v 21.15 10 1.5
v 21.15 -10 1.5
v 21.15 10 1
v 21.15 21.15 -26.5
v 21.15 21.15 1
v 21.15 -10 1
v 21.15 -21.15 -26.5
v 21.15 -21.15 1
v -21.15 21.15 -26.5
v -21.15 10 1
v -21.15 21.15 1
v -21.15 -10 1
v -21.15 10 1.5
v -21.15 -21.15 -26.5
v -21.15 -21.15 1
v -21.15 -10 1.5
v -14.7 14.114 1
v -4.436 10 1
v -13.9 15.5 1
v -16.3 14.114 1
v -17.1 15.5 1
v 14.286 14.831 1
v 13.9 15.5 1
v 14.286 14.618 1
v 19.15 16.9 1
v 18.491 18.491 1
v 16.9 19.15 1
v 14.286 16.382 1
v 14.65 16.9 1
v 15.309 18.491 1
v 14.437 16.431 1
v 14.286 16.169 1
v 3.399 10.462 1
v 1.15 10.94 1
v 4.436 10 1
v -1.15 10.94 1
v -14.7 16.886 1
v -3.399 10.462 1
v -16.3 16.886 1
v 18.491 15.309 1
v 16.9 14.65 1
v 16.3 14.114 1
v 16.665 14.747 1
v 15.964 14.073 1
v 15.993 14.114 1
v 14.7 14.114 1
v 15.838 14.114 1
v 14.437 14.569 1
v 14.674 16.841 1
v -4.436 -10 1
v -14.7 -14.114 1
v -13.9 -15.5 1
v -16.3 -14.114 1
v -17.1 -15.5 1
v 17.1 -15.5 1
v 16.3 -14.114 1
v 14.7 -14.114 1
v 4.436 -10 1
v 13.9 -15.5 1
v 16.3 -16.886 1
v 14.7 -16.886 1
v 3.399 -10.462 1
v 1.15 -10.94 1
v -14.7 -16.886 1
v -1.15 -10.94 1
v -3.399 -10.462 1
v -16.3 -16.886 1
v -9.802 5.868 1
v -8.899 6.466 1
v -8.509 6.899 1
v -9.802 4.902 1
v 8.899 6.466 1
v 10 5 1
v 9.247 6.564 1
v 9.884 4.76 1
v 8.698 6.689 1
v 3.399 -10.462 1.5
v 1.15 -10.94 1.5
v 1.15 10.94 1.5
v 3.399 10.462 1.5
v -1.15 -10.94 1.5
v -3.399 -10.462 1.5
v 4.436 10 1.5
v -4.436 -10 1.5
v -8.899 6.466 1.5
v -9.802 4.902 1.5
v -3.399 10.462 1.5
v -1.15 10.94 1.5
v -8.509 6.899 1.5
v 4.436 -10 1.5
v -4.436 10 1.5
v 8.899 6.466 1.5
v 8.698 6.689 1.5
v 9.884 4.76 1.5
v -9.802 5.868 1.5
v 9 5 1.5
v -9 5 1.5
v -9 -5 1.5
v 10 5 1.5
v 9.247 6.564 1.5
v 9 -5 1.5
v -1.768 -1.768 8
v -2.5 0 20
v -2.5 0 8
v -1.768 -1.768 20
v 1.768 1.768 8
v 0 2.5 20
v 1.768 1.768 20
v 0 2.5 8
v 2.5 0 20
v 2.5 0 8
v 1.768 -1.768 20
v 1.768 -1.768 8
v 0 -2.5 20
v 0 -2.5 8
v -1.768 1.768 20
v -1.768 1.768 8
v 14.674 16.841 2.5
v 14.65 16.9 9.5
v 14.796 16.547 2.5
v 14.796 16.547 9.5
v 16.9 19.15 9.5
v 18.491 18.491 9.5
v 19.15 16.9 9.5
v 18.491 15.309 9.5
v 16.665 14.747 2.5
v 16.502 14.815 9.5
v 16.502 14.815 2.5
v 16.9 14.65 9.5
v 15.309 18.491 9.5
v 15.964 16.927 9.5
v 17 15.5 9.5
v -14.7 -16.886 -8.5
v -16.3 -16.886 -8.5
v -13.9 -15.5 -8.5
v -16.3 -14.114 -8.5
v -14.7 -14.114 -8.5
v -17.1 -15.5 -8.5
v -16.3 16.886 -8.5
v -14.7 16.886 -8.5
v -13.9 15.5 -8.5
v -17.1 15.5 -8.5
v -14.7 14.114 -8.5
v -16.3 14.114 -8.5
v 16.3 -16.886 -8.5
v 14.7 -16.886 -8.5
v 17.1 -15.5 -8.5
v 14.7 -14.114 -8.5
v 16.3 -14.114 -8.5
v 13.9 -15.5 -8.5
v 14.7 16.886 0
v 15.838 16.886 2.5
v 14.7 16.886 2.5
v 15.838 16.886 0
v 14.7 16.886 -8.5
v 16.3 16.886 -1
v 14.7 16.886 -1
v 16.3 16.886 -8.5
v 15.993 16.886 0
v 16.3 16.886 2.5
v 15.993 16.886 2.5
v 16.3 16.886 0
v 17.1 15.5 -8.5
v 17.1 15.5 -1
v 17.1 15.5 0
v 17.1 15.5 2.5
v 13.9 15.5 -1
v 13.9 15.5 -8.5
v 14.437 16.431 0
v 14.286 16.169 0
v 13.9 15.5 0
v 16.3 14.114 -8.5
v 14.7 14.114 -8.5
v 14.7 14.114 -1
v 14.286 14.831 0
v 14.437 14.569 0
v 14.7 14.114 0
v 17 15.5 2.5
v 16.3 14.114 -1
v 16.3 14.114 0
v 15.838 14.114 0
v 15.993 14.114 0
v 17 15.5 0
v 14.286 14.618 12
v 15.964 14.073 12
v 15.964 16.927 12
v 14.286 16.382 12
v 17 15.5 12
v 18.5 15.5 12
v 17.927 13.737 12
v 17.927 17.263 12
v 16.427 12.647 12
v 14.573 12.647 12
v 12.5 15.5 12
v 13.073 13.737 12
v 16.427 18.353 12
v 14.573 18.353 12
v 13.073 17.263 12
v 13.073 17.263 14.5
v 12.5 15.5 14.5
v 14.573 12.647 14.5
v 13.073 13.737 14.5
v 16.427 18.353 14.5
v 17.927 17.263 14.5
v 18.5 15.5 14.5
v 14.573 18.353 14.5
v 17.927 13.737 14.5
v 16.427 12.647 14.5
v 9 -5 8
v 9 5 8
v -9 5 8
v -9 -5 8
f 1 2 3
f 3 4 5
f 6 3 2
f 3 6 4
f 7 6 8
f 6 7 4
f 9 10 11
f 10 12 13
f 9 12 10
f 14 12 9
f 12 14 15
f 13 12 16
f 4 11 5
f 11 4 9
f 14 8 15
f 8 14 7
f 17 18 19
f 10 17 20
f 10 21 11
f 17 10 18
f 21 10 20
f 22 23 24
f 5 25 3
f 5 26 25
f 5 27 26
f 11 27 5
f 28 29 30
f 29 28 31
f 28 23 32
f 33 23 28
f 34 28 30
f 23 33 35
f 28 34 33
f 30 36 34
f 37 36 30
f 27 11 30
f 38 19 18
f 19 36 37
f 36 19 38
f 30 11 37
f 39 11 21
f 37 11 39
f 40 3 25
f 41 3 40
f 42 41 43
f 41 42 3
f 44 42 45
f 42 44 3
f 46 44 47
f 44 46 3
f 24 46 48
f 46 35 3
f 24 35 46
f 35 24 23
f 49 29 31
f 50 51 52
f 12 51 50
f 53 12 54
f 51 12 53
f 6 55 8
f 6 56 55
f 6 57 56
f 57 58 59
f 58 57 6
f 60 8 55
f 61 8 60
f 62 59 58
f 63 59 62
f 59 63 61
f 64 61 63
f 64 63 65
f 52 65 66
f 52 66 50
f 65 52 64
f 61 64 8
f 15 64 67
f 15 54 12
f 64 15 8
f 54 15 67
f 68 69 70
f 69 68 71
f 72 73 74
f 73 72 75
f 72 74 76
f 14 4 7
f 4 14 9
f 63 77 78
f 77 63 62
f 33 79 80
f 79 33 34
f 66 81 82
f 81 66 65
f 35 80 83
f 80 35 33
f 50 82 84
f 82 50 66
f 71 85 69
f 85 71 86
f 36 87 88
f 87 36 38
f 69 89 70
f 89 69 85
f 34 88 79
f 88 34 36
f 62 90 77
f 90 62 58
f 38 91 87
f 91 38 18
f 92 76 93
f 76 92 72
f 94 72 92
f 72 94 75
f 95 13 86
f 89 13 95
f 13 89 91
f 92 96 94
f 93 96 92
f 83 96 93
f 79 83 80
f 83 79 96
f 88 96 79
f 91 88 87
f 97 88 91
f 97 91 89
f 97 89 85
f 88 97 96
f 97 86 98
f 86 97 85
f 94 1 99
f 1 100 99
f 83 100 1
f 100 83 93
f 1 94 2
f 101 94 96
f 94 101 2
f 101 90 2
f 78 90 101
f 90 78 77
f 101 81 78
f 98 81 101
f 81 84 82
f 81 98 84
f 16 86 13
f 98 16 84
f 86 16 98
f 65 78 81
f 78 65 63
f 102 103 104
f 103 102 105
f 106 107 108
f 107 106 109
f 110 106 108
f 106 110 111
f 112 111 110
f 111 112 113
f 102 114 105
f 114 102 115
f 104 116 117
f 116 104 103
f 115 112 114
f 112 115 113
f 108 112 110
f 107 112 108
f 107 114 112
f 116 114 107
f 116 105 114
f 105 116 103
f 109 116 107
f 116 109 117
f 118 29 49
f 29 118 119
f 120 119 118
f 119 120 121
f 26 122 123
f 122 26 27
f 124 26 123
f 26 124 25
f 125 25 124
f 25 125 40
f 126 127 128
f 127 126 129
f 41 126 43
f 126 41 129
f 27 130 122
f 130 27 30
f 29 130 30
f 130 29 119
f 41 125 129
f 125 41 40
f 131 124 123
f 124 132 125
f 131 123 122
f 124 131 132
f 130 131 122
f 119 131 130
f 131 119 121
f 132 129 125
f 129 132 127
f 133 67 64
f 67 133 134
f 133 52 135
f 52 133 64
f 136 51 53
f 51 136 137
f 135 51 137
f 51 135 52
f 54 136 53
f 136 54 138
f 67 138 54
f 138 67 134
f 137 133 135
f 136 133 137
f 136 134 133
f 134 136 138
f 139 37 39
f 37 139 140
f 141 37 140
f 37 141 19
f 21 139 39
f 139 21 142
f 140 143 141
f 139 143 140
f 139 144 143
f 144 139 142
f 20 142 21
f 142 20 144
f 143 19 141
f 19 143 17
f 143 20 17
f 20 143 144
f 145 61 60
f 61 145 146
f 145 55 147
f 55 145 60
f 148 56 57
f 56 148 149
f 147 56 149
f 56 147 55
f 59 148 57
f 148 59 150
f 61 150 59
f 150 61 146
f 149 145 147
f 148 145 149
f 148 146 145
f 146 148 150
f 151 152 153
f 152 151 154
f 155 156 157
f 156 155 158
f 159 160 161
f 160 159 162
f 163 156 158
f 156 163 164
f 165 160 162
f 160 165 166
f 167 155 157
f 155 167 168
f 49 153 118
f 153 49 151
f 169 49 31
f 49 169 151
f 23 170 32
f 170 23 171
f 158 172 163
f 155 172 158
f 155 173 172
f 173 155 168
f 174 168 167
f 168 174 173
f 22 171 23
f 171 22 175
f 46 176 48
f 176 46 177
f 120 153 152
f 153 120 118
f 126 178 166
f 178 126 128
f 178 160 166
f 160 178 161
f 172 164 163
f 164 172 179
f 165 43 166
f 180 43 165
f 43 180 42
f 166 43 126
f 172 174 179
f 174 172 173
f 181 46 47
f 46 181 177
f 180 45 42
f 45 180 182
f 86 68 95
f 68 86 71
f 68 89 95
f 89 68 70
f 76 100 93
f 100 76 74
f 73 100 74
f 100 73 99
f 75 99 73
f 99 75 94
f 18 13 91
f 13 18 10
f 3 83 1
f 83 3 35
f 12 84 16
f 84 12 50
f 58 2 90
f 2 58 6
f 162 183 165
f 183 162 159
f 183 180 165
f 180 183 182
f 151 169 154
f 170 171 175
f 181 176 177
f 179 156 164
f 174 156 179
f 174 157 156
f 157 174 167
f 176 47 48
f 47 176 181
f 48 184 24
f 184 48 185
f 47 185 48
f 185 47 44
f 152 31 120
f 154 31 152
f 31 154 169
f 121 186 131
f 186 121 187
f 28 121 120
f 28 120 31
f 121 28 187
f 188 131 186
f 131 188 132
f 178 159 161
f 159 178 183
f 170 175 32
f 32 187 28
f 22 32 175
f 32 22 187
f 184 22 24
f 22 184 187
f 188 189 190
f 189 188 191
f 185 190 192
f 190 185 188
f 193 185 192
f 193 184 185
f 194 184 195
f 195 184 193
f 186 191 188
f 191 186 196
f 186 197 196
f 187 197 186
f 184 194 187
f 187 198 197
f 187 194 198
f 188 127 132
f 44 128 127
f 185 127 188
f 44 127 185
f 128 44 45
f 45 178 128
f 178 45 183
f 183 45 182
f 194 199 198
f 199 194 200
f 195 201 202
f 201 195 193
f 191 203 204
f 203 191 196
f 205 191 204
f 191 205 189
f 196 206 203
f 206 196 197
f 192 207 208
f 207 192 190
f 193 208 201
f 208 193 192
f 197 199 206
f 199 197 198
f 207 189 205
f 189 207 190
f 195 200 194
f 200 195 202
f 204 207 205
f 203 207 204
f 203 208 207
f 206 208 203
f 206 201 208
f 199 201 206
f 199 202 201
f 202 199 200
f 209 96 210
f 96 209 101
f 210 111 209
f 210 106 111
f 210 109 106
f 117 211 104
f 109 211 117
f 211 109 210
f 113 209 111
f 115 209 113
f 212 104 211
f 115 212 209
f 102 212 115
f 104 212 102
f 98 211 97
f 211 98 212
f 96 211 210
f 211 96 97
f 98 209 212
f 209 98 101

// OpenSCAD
// Parameters
face_width = 42.3; //[21.15:84.6:0.1]
body_length = 26.5; //[13.25:53:0.1]
front_face_thickness = 2; //[1:4:0.1]
rear_cap_thickness = 2; //[1:4:0.1]
shaft_diameter = 5; //[2.5:10:0.1]
shaft_length = 20; //[10:40:0.1]
shaft_center_offset_x = 0; //[-5:5:0.1]
shaft_center_offset_y = 0; //[-5:5:0.1]
boss_diameter = 22; //[11:44:0.1]
boss_thickness = 2; //[1:5:0.1]
mount_hole_spacing = 31; //[15.5:62:0.1]
mount_hole_diameter = 3.2; //[1.6:6.4:0.1]
mount_hole_depth = 6; //[3:12:0.1]
corner_radius = 2; //[1:6:0.1]
eps = 0.5; //[0.2:2:0.1]
aux_plate_thickness = 2; //[1:6:0.1]
aux_plate_width = 42.3; //[21.15:84.6:0.1]
aux_plate_height = 20; //[10:40:0.1]
aux_plate_offset_y = 0; //[-30:30:0.1]
ttrack_pitch = 20; //[10:40:0.1]
ttrack_length = 60; //[30:120:0.1]
ttrack_hole_diameter = 5; //[2.5:10:0.1]
rail_pitch = 25; //[12.5:50:0.1]
rail_length = 75; //[37.5:150:0.1]
rail_hole_diameter = 4.5; //[2:9:0.1]
screw_shank_diameter = 3; //[1.5:6:0.1]
screw_length = 12; //[6:24:0.1]
screw_head_diameter = 6; //[3:12:0.1]
screw_head_height = 2.5; //[1:6:0.1]
washer_outer_diameter = 7; //[3.5:14:0.1]
washer_thickness = 1; //[0.5:3:0.1]
d_plug_width = 18; //[9:36:0.1]
d_plug_height = 10; //[5:20:0.1]
d_plug_depth = 8; //[4:16:0.1]
d_plug_offset_x = 0; //[-30:30:0.1]
d_plug_offset_y = 0; //[-30:30:0.1]
ttrack_insert_hole_diameter = 4; //[2:8:0.1]
ttrack_insert_spacing = 16; //[8:32:0.1]

// Connectivity overlap (1-2mm) to guarantee attachment
overlap = 1.5;

// Derived Z references (front face centered at z=0)
z_front_face_center = 0;
z_front_face_front  = z_front_face_center + front_face_thickness/2;
z_front_face_back   = z_front_face_center - front_face_thickness/2;

z_body_center = z_front_face_back - body_length/2 + overlap; // overlap into front face
z_body_front  = z_body_center + body_length/2;
z_body_back   = z_body_center - body_length/2;

z_rear_cap_center = z_body_back - rear_cap_thickness/2 + overlap; // overlap into body

z_aux_plate_center = z_front_face_front + aux_plate_thickness/2 - overlap; // overlap into front face

// --- FIX: add the missing/offset small vertical pin and ensure it is ATTACHED ---
// Place it on the top-right of the front face (as seen in top/bottom views),
// and embed it into the front face by 'overlap' so it cannot float.
pin_diameter = 4.5;
pin_height   = 10;
pin_offset_x =  face_width/2 - pin_diameter/2 - 2;  // near right edge, inside footprint
pin_offset_y =  face_width/2 - pin_diameter/2 - 2;  // near top edge, inside footprint
pin_z_center =  z_front_face_front + pin_height/2 - overlap; // overlaps into front face

// Modules
module motor_body() {
  color("Black")
    translate([0, 0, z_body_center])
      cube([face_width, face_width, body_length], center=true);
}

module front_face() {
  color("Black")
    translate([0, 0, z_front_face_center])
      cube([face_width, face_width, front_face_thickness], center=true);
}

module rear_cap_face() {
  color("Black")
    translate([0, 0, z_rear_cap_center])
      cube([face_width, face_width, rear_cap_thickness], center=true);
}

module shaft_boss_or_front_bearing_land() {
  color("Silver")
    translate([shaft_center_offset_x, shaft_center_offset_y,
               z_front_face_front + boss_thickness/2 - overlap])
      cylinder(r=boss_diameter/2, h=boss_thickness, center=true);
}

module output_shaft() {
  color("Silver")
    translate([shaft_center_offset_x, shaft_center_offset_y,
               (z_front_face_front + boss_thickness - overlap) + shaft_length/2 - overlap])
      cylinder(r=shaft_diameter/2, h=shaft_length, center=true);
}

// FIXED: small vertical cylindrical pin/shaft on top-right, now physically attached
module aux_pin_top_right() {
  color("DimGray")
    translate([pin_offset_x, pin_offset_y, pin_z_center])
      cylinder(r=pin_diameter/2, h=pin_height, center=true);
}

// Mount holes should be CUT from the motor face/body, not added as floating solids
module mount_hole_pattern_cut() {
  for (x = [-1, 1], y = [-1, 1]) {
    translate([x * mount_hole_spacing/2, y * mount_hole_spacing/2,
               z_front_face_center - mount_hole_depth/2])
      cylinder(r=mount_hole_diameter/2,
               h=mount_hole_depth + front_face_thickness + overlap*2,
               center=true);
  }
}

module aux_plate() {
  color("Silver")
    translate([0, aux_plate_offset_y, z_aux_plate_center])
      cube([aux_plate_width, aux_plate_height, aux_plate_thickness], center=true);
}

// These are HOLES in the aux plate; keep as cutters (not added solids)
module ttrack_hole_positions_cut() {
  for (i = [-1.5, -0.5, 0.5, 1.5]) {
    translate([0, aux_plate_offset_y + i * ttrack_pitch, z_aux_plate_center])
      cylinder(r=ttrack_hole_diameter/2, h=aux_plate_thickness + overlap*2, center=true);
  }
}

module rail_hole_positions_cut() {
  for (x = [-1, 0, 1]) {
    translate([x * rail_pitch, aux_plate_offset_y, z_aux_plate_center])
      cylinder(r=rail_hole_diameter/2, h=aux_plate_thickness + overlap*2, center=true);
  }
}

module ttrack_insert_hole_positions_cut() {
  for (x = [-0.5, 0.5]) {
    translate([x * ttrack_insert_spacing, aux_plate_offset_y + aux_plate_height/4, z_aux_plate_center])
      cylinder(r=ttrack_insert_hole_diameter/2, h=aux_plate_thickness + overlap*2, center=true);
  }
}

// Screw/washer: ensure they start inside the aux plate (overlap) so they are attached
module screw_and_washer() {
  color("DimGray") {
    // Place washer slightly embedded into aux plate
    translate([mount_hole_spacing/2, mount_hole_spacing/2,
               (z_aux_plate_center + aux_plate_thickness/2) - washer_thickness/2 - overlap])
      cylinder(r=washer_outer_diameter/2, h=washer_thickness, center=true);

    // Screw shank starts inside aux plate and extends outward
    translate([mount_hole_spacing/2, mount_hole_spacing/2,
               (z_aux_plate_center + aux_plate_thickness/2) + screw_length/2 - overlap])
      cylinder(r=screw_shank_diameter/2, h=screw_length, center=true);

    // Screw head on top, with slight overlap into shank
    translate([mount_hole_spacing/2, mount_hole_spacing/2,
               (z_aux_plate_center + aux_plate_thickness/2) + screw_length + screw_head_height/2 - overlap])
      cylinder(r=screw_head_diameter/2, h=screw_head_height, center=true);
  }
}

// D-plug: embed slightly into aux plate so it is attached
module d_plug_D() {
  color("Silver")
    translate([d_plug_offset_x, aux_plate_offset_y + d_plug_offset_y,
               (z_aux_plate_center + aux_plate_thickness/2) + d_plug_depth/2 - overlap])
      cube([d_plug_width, d_plug_height, d_plug_depth], center=true);
}

// Assembly: single connected solid; holes are subtracted (no floating discs)
module assembly() {
  union() {
    // Motor (with mounting holes cut)
    difference() {
      union() {
        motor_body();
        front_face();
        rear_cap_face();
        shaft_boss_or_front_bearing_land();
        output_shaft();

        // FIX: add the small top-right pin and ensure it overlaps into the front face
        aux_pin_top_right();
      }
      mount_hole_pattern_cut();
    }

    // Aux plate (with its holes cut) + attached hardware/connectors
    union() {
      difference() {
        aux_plate();
        union() {
          ttrack_hole_positions_cut();
          rail_hole_positions_cut();
          ttrack_insert_hole_positions_cut();
        }
      }
      screw_and_washer();
      d_plug_D();
    }
  }
}

assembly();
